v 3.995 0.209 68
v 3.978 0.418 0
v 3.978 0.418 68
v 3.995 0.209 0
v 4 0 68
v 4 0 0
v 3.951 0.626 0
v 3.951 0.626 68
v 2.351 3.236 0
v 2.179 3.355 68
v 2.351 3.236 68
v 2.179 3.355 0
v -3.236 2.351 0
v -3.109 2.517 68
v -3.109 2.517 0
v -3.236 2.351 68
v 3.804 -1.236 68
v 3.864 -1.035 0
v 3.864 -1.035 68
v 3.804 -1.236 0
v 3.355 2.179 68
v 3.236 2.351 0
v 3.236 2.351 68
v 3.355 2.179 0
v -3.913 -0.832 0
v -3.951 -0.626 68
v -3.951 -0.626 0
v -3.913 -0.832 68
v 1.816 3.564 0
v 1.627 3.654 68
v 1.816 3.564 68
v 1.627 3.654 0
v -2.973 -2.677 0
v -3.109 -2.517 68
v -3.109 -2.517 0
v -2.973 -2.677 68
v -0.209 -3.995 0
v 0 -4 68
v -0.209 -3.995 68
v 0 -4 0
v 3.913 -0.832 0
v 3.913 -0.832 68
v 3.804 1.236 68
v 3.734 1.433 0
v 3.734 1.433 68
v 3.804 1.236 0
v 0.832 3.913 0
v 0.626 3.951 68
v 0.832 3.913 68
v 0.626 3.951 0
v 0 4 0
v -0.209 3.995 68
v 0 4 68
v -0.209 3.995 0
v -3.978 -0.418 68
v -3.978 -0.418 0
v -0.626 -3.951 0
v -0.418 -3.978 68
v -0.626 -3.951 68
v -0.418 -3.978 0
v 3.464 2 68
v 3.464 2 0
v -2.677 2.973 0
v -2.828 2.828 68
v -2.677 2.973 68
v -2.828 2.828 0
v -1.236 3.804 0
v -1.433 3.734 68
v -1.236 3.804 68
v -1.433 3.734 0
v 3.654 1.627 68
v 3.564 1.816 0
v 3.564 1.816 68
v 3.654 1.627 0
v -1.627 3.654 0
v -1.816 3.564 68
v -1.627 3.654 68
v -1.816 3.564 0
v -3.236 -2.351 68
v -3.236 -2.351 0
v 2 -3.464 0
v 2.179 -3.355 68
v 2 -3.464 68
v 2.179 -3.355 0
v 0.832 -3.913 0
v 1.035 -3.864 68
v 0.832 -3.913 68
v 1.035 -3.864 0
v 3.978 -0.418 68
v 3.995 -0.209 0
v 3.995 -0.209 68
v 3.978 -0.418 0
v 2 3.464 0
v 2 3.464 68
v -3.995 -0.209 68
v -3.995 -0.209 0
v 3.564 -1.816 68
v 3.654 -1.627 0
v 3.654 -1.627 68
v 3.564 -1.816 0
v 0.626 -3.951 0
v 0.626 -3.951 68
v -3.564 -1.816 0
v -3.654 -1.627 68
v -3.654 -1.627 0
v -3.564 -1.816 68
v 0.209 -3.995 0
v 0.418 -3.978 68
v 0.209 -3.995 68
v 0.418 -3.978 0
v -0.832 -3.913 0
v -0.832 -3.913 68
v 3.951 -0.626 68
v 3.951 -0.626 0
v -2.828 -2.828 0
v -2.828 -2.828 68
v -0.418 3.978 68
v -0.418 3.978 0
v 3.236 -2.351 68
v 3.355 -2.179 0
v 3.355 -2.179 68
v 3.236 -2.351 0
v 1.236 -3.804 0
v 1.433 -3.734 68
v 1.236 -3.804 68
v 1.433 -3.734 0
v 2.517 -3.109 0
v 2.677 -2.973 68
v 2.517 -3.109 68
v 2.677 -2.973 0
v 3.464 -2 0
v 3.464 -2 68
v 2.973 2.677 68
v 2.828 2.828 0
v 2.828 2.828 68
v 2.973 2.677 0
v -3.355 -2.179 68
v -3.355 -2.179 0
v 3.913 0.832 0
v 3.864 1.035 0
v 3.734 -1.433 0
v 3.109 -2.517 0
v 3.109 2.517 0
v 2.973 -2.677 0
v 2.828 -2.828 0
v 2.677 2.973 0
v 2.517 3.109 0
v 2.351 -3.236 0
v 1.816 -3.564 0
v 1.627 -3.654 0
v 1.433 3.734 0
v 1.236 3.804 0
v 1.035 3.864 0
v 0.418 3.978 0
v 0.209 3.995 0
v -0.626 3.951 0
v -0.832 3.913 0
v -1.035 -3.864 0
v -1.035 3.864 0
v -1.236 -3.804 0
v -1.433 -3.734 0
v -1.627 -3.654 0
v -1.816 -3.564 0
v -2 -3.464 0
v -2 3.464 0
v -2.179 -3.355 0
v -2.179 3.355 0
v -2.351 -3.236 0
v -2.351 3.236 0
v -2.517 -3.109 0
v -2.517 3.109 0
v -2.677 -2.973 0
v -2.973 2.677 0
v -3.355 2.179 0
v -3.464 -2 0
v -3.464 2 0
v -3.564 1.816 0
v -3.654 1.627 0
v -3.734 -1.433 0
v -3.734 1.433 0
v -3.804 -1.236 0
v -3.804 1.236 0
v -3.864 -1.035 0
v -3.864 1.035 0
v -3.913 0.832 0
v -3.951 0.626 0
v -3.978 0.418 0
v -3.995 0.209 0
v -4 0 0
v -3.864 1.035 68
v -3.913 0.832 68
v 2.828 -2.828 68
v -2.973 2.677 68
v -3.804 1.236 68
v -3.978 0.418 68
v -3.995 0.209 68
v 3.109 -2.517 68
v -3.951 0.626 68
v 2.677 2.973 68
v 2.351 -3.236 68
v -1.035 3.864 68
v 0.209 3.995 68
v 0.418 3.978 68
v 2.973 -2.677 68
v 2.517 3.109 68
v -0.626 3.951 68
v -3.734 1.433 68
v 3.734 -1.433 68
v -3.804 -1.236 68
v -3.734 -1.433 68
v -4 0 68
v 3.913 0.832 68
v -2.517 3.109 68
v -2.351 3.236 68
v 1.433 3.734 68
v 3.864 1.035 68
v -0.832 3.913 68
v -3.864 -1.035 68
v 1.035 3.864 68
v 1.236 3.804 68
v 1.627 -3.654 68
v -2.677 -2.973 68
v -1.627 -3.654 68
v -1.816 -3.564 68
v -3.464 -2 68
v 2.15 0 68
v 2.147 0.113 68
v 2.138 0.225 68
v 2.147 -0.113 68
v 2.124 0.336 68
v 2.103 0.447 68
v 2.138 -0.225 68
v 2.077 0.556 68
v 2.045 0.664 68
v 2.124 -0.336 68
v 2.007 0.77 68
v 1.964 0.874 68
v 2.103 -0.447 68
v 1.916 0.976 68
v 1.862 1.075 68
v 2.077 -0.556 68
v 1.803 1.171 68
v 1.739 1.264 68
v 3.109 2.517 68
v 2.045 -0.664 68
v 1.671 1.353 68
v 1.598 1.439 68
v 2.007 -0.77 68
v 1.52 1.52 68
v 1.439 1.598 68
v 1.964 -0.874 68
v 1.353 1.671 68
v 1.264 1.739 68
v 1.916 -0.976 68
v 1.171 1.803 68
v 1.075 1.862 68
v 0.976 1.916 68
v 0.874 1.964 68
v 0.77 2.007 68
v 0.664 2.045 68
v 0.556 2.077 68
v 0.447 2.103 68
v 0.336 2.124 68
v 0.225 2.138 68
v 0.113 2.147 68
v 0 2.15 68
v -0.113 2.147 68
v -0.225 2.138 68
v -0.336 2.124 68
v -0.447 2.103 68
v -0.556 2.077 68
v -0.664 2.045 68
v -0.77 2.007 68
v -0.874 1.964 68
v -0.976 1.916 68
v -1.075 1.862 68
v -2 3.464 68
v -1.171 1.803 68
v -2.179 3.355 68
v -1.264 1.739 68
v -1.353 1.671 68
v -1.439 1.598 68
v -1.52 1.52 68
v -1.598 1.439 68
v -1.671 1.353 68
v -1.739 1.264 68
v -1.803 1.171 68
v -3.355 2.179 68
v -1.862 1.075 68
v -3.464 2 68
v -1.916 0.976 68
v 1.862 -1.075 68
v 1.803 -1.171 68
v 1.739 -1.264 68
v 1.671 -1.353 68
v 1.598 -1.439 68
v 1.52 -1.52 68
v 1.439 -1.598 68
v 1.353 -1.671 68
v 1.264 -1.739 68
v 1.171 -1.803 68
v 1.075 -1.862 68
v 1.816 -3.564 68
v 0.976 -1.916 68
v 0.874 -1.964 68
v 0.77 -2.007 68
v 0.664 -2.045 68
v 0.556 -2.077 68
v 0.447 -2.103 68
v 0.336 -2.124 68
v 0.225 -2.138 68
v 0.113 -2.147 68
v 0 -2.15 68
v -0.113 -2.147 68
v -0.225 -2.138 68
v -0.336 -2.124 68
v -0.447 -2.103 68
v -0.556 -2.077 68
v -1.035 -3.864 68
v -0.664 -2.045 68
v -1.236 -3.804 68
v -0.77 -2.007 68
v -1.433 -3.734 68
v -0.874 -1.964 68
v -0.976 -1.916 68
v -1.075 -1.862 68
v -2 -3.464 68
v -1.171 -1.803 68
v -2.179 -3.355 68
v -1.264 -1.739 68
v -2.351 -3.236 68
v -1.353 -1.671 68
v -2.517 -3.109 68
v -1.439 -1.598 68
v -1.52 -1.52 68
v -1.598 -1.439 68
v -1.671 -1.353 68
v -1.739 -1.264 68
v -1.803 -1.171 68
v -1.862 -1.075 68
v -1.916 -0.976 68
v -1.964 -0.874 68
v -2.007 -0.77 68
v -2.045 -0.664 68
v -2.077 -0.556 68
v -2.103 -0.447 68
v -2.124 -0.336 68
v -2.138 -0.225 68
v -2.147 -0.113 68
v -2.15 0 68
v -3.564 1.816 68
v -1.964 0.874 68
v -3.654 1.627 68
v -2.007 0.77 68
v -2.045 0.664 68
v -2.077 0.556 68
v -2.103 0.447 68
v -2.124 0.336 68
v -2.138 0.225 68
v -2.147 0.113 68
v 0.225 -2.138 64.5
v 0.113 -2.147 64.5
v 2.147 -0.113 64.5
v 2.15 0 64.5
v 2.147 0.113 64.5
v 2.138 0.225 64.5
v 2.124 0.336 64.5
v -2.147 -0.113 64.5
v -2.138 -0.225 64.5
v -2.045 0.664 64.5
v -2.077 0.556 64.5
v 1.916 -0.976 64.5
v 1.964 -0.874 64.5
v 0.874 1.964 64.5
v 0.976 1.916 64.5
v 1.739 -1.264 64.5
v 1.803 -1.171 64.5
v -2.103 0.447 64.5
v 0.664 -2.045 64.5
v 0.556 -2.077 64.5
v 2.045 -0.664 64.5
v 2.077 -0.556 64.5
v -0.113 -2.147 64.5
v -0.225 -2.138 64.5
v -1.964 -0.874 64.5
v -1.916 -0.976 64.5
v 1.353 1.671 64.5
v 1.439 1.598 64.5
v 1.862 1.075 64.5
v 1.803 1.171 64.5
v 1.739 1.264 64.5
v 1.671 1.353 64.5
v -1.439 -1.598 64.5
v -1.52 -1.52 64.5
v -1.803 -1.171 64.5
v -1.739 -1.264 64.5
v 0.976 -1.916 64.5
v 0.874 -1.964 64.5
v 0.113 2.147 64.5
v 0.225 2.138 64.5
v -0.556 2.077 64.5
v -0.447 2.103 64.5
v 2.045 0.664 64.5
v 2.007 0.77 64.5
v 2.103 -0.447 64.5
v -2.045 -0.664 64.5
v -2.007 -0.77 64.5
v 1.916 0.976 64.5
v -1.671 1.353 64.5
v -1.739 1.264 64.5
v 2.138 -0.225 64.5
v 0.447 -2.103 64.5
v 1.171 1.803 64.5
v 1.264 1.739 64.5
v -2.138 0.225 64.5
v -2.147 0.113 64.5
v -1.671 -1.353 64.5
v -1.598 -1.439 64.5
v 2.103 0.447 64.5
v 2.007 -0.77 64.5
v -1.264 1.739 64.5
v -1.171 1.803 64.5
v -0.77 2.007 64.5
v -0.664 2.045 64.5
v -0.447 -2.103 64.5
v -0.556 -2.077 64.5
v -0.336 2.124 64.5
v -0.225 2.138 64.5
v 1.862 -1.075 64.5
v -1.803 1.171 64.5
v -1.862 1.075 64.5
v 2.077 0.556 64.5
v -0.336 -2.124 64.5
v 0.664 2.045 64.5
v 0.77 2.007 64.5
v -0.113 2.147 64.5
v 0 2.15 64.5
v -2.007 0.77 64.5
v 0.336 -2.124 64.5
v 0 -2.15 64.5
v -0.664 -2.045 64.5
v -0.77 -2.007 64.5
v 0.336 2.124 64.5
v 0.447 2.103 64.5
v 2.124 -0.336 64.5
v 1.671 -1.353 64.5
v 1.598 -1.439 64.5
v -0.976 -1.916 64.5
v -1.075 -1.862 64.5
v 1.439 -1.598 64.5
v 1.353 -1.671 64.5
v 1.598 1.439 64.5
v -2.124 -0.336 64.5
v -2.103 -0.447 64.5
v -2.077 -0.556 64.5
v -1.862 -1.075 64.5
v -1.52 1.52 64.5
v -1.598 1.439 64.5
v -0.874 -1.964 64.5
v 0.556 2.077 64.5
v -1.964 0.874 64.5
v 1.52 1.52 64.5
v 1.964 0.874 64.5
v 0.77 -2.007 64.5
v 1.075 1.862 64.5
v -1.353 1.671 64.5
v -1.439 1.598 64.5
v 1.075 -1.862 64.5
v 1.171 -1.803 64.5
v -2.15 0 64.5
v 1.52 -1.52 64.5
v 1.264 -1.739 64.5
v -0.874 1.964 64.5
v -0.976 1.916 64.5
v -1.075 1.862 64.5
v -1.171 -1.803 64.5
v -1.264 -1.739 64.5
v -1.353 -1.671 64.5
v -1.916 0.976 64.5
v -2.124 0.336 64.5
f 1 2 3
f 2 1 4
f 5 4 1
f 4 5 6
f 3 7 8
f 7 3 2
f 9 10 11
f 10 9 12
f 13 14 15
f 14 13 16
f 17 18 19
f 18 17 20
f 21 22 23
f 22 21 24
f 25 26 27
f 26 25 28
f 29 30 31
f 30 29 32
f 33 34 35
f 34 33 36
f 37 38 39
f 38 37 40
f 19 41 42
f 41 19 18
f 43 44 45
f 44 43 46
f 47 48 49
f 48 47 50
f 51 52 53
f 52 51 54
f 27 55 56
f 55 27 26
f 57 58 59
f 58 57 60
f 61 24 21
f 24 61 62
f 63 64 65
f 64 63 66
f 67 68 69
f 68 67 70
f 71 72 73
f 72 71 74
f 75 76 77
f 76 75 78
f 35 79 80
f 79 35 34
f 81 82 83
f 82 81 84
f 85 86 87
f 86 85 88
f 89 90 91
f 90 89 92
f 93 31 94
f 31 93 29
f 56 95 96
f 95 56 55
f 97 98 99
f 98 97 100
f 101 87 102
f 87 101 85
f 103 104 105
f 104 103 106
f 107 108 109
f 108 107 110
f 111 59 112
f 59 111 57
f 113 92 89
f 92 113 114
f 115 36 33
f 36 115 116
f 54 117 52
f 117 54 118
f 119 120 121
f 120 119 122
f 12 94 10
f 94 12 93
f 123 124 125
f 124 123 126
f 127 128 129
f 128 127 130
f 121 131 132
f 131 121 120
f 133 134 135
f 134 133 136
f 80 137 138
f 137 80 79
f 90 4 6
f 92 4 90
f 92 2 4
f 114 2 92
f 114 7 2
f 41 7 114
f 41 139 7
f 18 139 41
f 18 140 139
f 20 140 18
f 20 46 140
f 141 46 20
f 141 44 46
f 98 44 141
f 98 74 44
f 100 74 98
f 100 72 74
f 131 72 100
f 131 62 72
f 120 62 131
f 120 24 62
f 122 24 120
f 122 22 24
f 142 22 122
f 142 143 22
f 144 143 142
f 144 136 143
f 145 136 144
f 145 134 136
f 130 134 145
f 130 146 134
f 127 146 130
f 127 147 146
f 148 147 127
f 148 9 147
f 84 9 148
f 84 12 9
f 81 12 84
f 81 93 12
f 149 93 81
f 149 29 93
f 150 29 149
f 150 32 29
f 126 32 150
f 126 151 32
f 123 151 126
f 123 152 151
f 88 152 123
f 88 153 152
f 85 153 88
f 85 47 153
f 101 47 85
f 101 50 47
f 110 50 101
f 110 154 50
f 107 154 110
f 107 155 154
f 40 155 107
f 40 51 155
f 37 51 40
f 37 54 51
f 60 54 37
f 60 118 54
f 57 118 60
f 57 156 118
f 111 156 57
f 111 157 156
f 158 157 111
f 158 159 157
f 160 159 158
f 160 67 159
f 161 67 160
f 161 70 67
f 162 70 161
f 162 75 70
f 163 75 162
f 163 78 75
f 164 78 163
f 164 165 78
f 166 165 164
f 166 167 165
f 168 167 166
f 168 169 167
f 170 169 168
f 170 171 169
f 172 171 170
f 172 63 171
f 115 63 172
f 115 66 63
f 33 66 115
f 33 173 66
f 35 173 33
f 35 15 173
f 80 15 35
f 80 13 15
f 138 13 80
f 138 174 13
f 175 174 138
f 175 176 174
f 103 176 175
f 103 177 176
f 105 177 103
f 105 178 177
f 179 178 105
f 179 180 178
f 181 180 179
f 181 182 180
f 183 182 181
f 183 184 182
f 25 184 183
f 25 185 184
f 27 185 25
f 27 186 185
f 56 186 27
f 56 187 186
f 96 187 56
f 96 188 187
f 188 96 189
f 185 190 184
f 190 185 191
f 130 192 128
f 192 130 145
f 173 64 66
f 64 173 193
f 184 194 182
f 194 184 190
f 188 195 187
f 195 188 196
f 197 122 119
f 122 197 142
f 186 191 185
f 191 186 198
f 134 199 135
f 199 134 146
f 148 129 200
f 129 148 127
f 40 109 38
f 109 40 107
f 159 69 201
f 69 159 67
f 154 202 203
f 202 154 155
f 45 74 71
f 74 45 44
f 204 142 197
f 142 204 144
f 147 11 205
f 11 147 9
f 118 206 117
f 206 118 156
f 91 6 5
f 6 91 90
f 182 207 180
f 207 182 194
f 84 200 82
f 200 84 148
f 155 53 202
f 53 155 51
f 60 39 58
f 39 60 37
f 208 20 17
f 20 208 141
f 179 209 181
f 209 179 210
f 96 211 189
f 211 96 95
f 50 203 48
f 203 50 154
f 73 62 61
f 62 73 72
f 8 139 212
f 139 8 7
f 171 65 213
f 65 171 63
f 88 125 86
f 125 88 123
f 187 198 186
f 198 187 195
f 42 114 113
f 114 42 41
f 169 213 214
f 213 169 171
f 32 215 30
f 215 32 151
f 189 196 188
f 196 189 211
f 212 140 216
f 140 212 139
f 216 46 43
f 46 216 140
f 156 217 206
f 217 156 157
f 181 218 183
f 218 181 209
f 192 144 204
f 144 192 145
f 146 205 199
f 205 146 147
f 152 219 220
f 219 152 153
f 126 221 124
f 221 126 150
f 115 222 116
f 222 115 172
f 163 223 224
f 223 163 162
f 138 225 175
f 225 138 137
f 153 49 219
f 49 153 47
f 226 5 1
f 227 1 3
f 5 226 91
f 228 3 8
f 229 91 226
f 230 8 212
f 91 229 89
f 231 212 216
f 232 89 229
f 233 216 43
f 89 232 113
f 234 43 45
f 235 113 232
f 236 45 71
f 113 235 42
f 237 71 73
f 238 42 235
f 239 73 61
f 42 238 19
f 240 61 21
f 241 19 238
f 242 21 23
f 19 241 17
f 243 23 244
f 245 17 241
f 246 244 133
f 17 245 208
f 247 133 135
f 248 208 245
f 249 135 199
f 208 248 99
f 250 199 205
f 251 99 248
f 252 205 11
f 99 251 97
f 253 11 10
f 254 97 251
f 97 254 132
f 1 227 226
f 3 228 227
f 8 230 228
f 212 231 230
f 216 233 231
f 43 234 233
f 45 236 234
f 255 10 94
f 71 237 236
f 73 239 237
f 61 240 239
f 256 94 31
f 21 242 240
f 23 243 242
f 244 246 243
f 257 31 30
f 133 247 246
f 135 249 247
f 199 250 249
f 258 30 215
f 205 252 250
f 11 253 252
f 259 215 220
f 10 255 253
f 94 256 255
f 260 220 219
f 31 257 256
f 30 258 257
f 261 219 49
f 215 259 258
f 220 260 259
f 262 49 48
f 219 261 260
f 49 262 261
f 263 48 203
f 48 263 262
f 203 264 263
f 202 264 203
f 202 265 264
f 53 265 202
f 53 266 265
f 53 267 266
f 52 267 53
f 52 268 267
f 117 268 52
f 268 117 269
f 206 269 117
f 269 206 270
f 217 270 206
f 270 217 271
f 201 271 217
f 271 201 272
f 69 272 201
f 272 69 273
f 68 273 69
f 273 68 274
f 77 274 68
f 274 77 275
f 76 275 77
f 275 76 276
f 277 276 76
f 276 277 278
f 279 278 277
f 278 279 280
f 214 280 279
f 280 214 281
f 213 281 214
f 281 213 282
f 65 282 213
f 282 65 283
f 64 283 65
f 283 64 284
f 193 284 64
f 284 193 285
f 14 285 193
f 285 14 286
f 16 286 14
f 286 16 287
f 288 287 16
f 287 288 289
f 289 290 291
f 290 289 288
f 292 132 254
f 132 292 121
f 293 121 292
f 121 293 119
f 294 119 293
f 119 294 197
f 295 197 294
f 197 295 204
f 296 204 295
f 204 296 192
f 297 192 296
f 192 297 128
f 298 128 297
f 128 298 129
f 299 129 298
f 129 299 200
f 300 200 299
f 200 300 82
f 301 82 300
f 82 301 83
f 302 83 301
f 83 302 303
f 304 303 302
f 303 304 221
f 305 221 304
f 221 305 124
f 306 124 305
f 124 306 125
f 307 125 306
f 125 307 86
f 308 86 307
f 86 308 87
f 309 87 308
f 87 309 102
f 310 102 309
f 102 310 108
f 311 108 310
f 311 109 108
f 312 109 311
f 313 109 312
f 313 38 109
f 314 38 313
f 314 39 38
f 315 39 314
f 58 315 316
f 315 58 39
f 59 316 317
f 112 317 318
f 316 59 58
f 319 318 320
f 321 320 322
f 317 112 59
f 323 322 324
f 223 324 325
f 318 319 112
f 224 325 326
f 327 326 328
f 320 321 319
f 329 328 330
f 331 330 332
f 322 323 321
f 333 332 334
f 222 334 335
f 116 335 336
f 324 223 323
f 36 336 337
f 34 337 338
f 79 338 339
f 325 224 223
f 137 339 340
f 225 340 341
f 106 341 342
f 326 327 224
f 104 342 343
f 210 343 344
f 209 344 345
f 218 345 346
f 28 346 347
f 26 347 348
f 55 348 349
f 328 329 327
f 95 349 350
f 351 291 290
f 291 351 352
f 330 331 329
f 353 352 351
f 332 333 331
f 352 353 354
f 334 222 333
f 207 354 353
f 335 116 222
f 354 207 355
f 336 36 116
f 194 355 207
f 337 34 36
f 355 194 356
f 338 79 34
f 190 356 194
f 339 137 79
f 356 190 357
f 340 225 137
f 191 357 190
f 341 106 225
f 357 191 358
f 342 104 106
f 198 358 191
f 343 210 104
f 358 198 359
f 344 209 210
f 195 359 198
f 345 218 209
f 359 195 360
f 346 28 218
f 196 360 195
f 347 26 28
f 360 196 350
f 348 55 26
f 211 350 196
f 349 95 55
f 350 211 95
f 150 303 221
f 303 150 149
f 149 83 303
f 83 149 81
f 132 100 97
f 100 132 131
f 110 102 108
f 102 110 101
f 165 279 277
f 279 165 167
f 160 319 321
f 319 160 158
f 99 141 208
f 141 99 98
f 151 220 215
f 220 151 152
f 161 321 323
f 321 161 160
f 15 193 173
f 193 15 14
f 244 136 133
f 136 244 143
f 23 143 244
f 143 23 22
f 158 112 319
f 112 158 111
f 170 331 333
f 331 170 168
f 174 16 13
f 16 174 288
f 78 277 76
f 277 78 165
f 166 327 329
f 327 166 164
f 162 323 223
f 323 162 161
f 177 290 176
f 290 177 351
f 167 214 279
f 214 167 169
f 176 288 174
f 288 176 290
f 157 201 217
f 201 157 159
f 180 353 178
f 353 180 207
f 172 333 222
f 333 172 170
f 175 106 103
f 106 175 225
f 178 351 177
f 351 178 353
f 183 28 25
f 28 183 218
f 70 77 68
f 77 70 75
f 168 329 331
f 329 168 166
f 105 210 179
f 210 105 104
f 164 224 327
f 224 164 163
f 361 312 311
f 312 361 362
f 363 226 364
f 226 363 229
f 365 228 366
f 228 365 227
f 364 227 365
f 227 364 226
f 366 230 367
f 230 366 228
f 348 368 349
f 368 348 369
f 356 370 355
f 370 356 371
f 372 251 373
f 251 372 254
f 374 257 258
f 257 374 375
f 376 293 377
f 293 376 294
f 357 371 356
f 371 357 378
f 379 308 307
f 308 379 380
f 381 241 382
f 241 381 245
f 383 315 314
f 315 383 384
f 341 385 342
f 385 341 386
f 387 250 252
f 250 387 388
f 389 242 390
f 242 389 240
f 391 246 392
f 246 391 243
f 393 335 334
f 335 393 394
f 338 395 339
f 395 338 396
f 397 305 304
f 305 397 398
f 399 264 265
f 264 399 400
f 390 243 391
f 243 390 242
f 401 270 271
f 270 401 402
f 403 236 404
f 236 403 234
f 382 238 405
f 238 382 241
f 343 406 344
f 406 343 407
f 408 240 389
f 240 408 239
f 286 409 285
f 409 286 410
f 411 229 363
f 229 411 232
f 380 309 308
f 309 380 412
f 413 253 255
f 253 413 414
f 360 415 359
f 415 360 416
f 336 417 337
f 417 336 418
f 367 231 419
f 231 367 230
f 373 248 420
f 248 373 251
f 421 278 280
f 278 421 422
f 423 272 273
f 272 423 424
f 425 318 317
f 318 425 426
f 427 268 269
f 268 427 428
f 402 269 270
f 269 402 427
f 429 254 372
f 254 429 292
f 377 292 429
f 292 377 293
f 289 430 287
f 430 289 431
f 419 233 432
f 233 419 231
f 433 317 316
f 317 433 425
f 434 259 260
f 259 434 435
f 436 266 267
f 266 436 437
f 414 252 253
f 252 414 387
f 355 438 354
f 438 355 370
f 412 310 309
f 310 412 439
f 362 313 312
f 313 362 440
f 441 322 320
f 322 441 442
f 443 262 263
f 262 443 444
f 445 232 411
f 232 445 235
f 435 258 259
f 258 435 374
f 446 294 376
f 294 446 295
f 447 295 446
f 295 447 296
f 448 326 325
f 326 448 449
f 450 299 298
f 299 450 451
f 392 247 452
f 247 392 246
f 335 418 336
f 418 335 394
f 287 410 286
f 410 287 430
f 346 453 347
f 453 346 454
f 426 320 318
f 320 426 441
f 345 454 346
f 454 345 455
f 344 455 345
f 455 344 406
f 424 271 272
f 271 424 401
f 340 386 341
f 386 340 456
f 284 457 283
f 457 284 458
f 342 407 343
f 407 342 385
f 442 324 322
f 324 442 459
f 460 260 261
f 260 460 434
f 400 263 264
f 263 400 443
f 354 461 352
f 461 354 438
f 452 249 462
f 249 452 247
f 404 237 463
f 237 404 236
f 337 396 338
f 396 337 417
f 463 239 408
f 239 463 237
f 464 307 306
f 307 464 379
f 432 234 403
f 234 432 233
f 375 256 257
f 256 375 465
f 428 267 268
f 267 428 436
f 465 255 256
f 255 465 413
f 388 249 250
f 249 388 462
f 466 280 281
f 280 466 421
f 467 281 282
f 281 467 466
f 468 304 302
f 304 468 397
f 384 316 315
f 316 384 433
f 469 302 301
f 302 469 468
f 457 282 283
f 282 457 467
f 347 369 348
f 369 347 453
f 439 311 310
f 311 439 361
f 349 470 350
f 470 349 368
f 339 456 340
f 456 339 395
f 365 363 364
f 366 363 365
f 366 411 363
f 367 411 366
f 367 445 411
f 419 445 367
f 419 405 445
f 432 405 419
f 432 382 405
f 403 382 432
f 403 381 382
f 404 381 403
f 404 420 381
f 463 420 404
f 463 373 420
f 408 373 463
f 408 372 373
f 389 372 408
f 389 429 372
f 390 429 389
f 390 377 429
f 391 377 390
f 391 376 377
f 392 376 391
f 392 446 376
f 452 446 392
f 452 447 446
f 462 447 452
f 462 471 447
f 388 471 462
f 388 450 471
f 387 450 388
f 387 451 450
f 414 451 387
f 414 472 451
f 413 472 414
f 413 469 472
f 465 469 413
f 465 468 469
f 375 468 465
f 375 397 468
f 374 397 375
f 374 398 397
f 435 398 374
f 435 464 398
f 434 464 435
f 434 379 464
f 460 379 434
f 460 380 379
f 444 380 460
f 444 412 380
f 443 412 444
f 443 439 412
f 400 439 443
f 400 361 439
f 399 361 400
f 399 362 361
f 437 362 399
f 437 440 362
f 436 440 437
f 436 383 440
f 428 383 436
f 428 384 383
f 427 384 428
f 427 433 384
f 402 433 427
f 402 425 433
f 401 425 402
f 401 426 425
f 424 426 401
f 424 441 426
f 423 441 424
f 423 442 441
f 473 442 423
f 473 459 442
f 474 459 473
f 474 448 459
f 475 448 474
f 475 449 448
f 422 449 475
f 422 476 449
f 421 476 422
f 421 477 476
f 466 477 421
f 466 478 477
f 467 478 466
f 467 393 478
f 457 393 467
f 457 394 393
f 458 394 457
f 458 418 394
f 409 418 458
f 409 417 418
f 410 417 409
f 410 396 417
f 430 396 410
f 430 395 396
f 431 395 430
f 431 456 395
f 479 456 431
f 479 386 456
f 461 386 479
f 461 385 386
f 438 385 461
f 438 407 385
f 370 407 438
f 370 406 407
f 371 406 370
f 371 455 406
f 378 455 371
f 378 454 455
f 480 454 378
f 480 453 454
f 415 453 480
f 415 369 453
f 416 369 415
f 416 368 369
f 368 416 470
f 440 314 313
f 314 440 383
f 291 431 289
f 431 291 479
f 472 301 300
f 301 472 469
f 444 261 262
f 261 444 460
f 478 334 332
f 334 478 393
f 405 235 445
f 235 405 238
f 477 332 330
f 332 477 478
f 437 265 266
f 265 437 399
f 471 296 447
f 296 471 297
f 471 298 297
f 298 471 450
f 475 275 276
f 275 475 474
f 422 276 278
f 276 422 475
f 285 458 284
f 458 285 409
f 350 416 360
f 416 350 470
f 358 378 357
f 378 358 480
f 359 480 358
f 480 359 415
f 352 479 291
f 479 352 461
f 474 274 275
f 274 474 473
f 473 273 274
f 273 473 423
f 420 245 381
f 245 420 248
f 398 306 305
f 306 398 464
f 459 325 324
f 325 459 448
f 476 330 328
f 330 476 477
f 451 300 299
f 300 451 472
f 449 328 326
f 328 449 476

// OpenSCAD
// ==========================================================================
//  TEST VARIANT — hand-built, NOT produced by build/build.py.
//  Forked from v1.0 SCADs/Bottle_Hex_Shaft_v1.scad (Turtle Body v1.10.0).
//  Do not treat this as a source-of-truth bundle: it is a one-off experiment
//  and is not wired into lib/, src/, build/build.py, build/lint.py,
//  build/test.py or VERSION.json. If this redesign is adopted for real, port
//  it into lib/params.scad + lib/hex_shaft.scad through the normal workflow
//  (CLAUDE.md section 15) instead of hand-editing this file further.
//
//  DELIBERATE REDESIGN, latest cut: the hex-top piece is dropped entirely --
//  this file now emits ONLY the round shaft, a single straight Ø8 mm
//  cylinder (no 7 mm neck, no taper). Overall length is 20 mm longer than
//  the previous 48 mm two-part shaft length, i.e. 68 mm. The magnet recess
//  opens at one end, deepened to 3.5 mm (was 3) with a wider +0.3 mm
//  diametral fit margin (was +0.1) for easier insertion.
//
//  Units: mm. License: CERN-OHL-S-2.0 (same as the rest of this repository).
// ==========================================================================

/* [Round shaft -- straight, constant diameter, no taper] */
shaft_d   = 8;    // full diameter, constant along the whole length
shaft_len = 68;   // previous two-part length (48) + 20 mm

/* [Magnet recess -- blind hole at one end] */
magnet_recess_enabled = true;
magnet_diameter    = 4;    // nominal magnet size
magnet_fit_margin  = 0.3;  // diametral allowance added on top, for insertion (was 0.1)
magnet_depth       = 3.5;  // was 3

/* [Render] */
fn = 120; // [48:8:240]

// [bundle] begin use <params.scad>
// ==========================================================================
//  Turtle Body -- shared dimension contract
// --------------------------------------------------------------------------
//  The single source of truth for every dimension that more than one
//  subsystem depends on. Values are exposed as zero-argument functions so
//  this file can be pulled in with `use <params.scad>` (which ignores
//  top-level variable assignments) without polluting any namespace.
//
//  lib/ modules take these as DEFAULT argument values:
//      module control_cap(roof_t = p_cap_roof_t(), ...) { ... }
//  so a src/ wrapper can still override one value from its customizer block
//  while every other subsystem keeps the shared number.
//
//  Rules:
//   * one function per concept, canonical name (see CLAUDE.md cross-file table)
//   * derived values are functions of other p_*() functions, never re-typed
//   * mm throughout; names say _d (diameter), _r (radius), _t (thickness),
//     _len / _h (axial), _af (hex across-flats)
//   * do NOT add a bare `x = ...;` here -- bundle.py / lint.py will reject it
// ==========================================================================

// ---- tolerances and render quality --------------------------------------
function p_eps()          = 0.02;   // Boolean overlap / cut-through fudge
function p_fit_clearance() = 0.2;   // wood joint: TOTAL extra slot width, centred on the board
function p_fn_plastic()   = 120;    // printed PLA parts (cap, cage, axle, mold)
function p_fn_wood()      = 96;     // cut wooden parts
function p_fn_curve()     = 180;    // fine profile curves (bottle, sails)

// ---- bottle (the foundation reference) ---------------------------------
function p_bottle_d()        = 82;    // outside diameter
function p_bottle_h()        = 305;   // total height incl. ordinary screw cap
function p_bottle_wall_t()   = 0.5;   // modelling assumption, not a measurement
function p_bottle_cap_d()    = 31;    // ordinary screw cap (NOT the control-cap disk)
function p_bottle_cap_h()    = 17;    // ordinary screw cap height (rear-fin / ballast formulas)
function p_collar_d()        = 34;    // bottle collar, independent of cap diameter
function p_top_dome_h()      = 62;
function p_bottom_dome_h()   = 25;
function p_dome_power()      = 2.5;   // superellipse exponent
function p_bottle_neck_h()   = 5;
function p_bottle_collar_h() = 1;
function p_bottle_neck_d()   = p_bottle_cap_d() - 3;   // 28: neck is 3 mm under the cap
function p_bottle_base_ratio() = 0.88; // slightly narrower footprint at the base
function p_bottle_profile_steps() = 16;
// cut bottle (control head): the lower dome is removed and a short socket is
// bored so the control-cap insert slides in. Cut plane sits 5 mm above the
// bottom dome height.
function p_bottle_cut_extra()  = 5;
function p_bottle_cut_height() = p_bottom_dome_h() + p_bottle_cut_extra();   // 30

// nominal bottle interior and the cap insert that enters it
function p_bottle_socket_d() = p_bottle_d() - 2 * p_bottle_wall_t();          // 81
function p_insert_shaft_radial_clearance() = 1;
function p_insert_shaft_d()  = p_bottle_socket_d()
                             - 2 * p_insert_shaft_radial_clearance();          // 79

// ---- wooden stock -----------------------------------------------------
function p_wood_t()          = 12;    // shared board / slat thickness
function p_fin_board_w()     = 93;    // shared fin-system stock width
function p_screw_side_offset() = 25;  // mounting-hole inset from a John end

// ---- Ecojoiner port --------------------------------------------------
// A port must swallow the bottle's tapered top (the top dome) plus a seating
// allowance, so its axial length is DERIVED from the bottle, not fixed. This
// is the same rule the HopeTurtles.org generators use
// (port_length = taper_height + port_allowance); until 2026-09-08 lib carried
// the evaluated constant 82 instead, which silently broke the rule for any
// bottle other than the reference one. Ballast and Ecojoiner both read it.
function p_port_allowance()  = 20;                 // seating allowance beyond the dome
function p_port_length()     = p_top_dome_h() + p_port_allowance();   // 62 + 20 = 82
function p_port_height()     = p_bottle_d();       // opening height == bottle diameter (asserted)

// ---- M6 hardware ---------------------------------------------------
function p_m6_clearance_d()  = 6.4;   // M6 clearance hole
function p_m6_bolt_shaft_d() = 6;     // visual placeholder only
function p_m6_bolt_head_d()  = 12;
function p_m6_bolt_head_t()  = 4;

// ---- control cap (large stationary disk; see CLAUDE.md s7) ----------
//  TB-03 resolution: repository 5 mm roof / 2 mm boss is authoritative;
//  the axle (below) is derived to this datum.
function p_cap_disk_d()      = 100;   // control-cap disk (independent of p_bottle_cap_d)
function p_cap_roof_t()      = 5;     // disk / roof thickness
function p_cap_boss_depth()  = 2;     // extra projection of the centre boss into the hollow cap
function p_cap_boss_d()      = 18;
function p_cap_insert_len()  = 35;    // straight insert shaft length
function p_cap_insert_wall_t() = 4;
function p_cap_entry_chamfer_h()     = 1;
function p_cap_entry_chamfer_delta() = 1;
function p_cap_axle_bore_d() = 8.6;   // 0.3 mm radial clearance to the Ø8 shaft
function p_cap_cage_radial_clearance() = 1;   // cap disk -> cage inner wall (radial)
function p_cap_total_h()     = p_cap_roof_t() + p_cap_insert_len();           // 40
function p_cap_bearing_len() = p_cap_roof_t() + p_cap_boss_depth();           // 7

// buttons (through both cap and cage)
function p_button_upper_d()  = 17;    // clearance hole in the cap
function p_button_axis()     = "y";   // "x" or "y"
function p_button_radius()   = 24;    // radial position of the two button centres (48 mm apart)

// ---- silicone seal grooves + rings (CLAUDE.md s8) ------------------
function p_seal_groove_count()      = 2;
function p_seal_groove_axial_h()    = 2;   // groove height
function p_seal_groove_radial_depth() = 2; // groove depth
function p_seal_groove1_from_shoulder() = 12;  // groove centre, measured from the insert SHOULDER
function p_seal_groove2_from_shoulder() = 25;
function p_seal_ring_axial_t()      = 1.5;  // cast ring thickness
function p_seal_ring_radial_w()     = 5;    // NOT validated; 3.5 was a suggested milder prototype
function p_seal_groove_root_d() = p_insert_shaft_d()
                                - 2 * p_seal_groove_radial_depth();            // 75

// ---- round / hex centre axle (CLAUDE.md s9) -----------------------
//  Derived to the 5/2 cap datum (TB-03/TB-04). round_inside_cap is measured
//  from the roof underside and INCLUDES the boss -- do not add the boss again.
function p_axle_round_d()        = 8;
function p_axle_round_ext()      = 1;    // projection above the cap's outer face
function p_axle_round_inside_cap() = p_cap_insert_len() - 5;  // 30: roof underside to round end (incl. boss)
function p_axle_round_len()      = p_axle_round_inside_cap() + p_cap_roof_t() + p_axle_round_ext();  // 36
function p_axle_hex_af()         = 10.0; // shaft across-flats (0.3 mm to the Ø10.3 cage bore)
function p_axle_hex_len()        = 23;
function p_axle_join_overlap()   = 0.2;  // hex<->round Boolean overlap
function p_axle_total_len()      = p_axle_hex_len() + p_axle_round_len();
function p_axle_hex_corner_d()   = p_axle_hex_af() / cos(30);                  // ~11.55
function p_magnet_d()            = 3;    // AS5600 sensing magnet recess
function p_magnet_t()            = 1;

// ---- axle rotary shaft O-ring (waterproofs the axle bore; cast in the mold) ----
//  A round-section O-ring seated in a gland in the control-cap bore, sealing
//  against the spinning round section of the axle. ID is tied to the shaft.
function p_axle_oring_cs()     = 2.0;                                   // cross-section
function p_axle_oring_id()     = p_axle_round_d();                      // 8 -- hugs the shaft
function p_axle_oring_od()     = p_axle_oring_id() + 2 * p_axle_oring_cs();          // 12
function p_axle_oring_mean_r() = (p_axle_oring_id() + p_axle_oring_cs()) / 2;        // 5
//  gland cut into the cap bore for it
function p_cap_oring_squeeze()      = 0.25;  // radial squeeze on the seal
function p_cap_oring_gland_od()     = p_axle_oring_od() - 2 * p_cap_oring_squeeze(); // 11.5
function p_cap_oring_gland_w()      = 1.3 * p_axle_oring_cs();                       // 2.6 axial
function p_cap_oring_gland_from_face() = 3.5; // gland centre, from the cap outer face, along the bore

// ---- rotating control cage (CLAUDE.md s6) ------------------------
function p_cage_wall_t()     = 6.5;   // radial wall thickness
function p_cage_roof_t()     = 4;     // roof / surface plate thickness
function p_cage_inner_d()    = p_cap_disk_d() + 2 * p_cap_cage_radial_clearance();   // 102
function p_cage_outer_d()    = p_cage_inner_d() + 2 * p_cage_wall_t();               // 115
function p_cage_skirt_depth()   = 44;   // roof underside to the ORIGINAL skirt rim
function p_cage_peak_extension() = 20;  // crest extends this far past the original rim
function p_cage_valley_wall_h()  = 10;  // minimum wall depth between mounts
function p_cage_total_h()    = p_cage_skirt_depth() + p_cage_roof_t();              // 48 (native)
function p_cage_notch_count()   = 4;
function p_cage_notch_w()    = 22.5;  // batten groove width
function p_cage_notch_depth() = 3.7;
function p_cage_wave_segments() = 240;
function p_cage_hub_d()      = 29;
function p_cage_pocket_d()   = 26;    // top clip pocket (control_cage top_pocket, OFF by default)
function p_cage_pocket_depth() = 4;   //   "        "     "
function p_cage_hex_bore_af() = 10.3; // central hex bore (0.3 mm to the Ø10.0 shaft)
function p_cage_bearing_d()  = 9;     // hemispherical bearing bump
function p_cage_bearing_count() = 8;
function p_cage_bearing_pcd() = p_cap_disk_d() - p_cage_bearing_d() + 0.5;          // 91.5
function p_cage_top_hole_d() = 18;    // central button / access hole through the roof
function p_cage_mount_hole_d() = 3.2; // two M3 clearance holes per batten / groove
function p_cage_mount_pitch()  = 32;  // vertical pitch of the pair
function p_cage_lower_hole_from_tip() = 10;
// 45-deg outward chamfer on the roof-top outer edge (0 = sharp). The cage
// prints roof-face-down, so this bevel flares OUT from the bed and stays
// printable; it runs the full perimeter, batten grooves included. See
// lib/control_cage.scad.
function p_cage_roof_bevel() = 3;

// ---- sail apparatus (CLAUDE.md s10) ---------------------------
function p_side_batten_h()   = 205;
function p_side_batten_w()   = 20;
function p_side_batten_radial_t() = 10;
function p_top_crossbar_len() = 6 * p_bottle_d();   // 492
function p_top_crossbar_w()  = 22;
function p_top_crossbar_t()  = p_wood_t();          // 12
function p_sail_bar_axle_hole_d() = 12;             // Ø12; fits the ~11.55 hex corner dia
function p_bottom_rail_len() = 3 * p_bottle_d();    // 246
function p_bottom_rail_bottle_clearance() = 1;
function p_sail_rail_color()  = [0.56, 0.39, 0.39]; // brown (top AND bottom rails)
function p_c_piece_color()    = [1.0, 0.52, 0.20];  // orange, retained

// ---- rear fin + solar support (CLAUDE.md s11) ----------------
function p_solar_panel_w() = 148;
function p_solar_panel_h() = 223;
function p_solar_panel_t() = 2.5;    // real panel, independent of wood thickness
function p_rear_shaft_len() = p_bottle_h()
                            + (2/3) * (p_fin_board_w() - 2 * p_wood_t())
                            - p_bottle_cap_h();                                 // 334
function p_rear_half_lap_engagement() = 42;   // green/yellow interlock depth
function p_rear_fin_tab_width() = 15;
function p_rear_shaft_width()   = 59;
// TB-07: the green-slat mounting hole follows the mating Ecojoiner John, not a
// fixed 50 mm. Derived from the install transform; the john_length/2 terms
// cancel, leaving a pure function of the shared contract (= 103 at defaults).
function p_rear_shaft_hole_from_front() =
    p_rear_shaft_len() - p_screw_side_offset() - p_bottle_h()
    + p_bottle_cap_h() + p_port_height();

// ---- ballast attachment (CLAUDE.md s12) ---------------------
function p_ballast_core_w()   = p_bottle_d() - 2 * p_wood_t();                  // 58
function p_ballast_core_len() = p_bottle_h() - p_bottle_cap_h() + 6 * p_wood_t();  // 360
function p_ballast_slat_gap() = p_bottle_d();          // clear inner-face gap
function p_ballast_slat_spacing() = p_bottle_d() + p_wood_t();                  // 94
function p_ballast_board_len() = 3.5 * p_bottle_d();   // 287
function p_ballast_fin_len()   = 3 * p_bottle_d();     // 246
function p_ballast_lock_w()    = 5 * p_wood_t();       // 60

// ---- neutral wood shades (used when enable_color_coding = false) -------
// With the full colour code off, every wooden subsystem still renders in its
// OWN shade of brown so the parts stay visually separable. All are warm browns
// (R > G > B) spaced by lightness. The two large fins share one darker shade so
// they read as a matched pair, distinct from the rest of their own assembly.
function p_wood_shade_sail()     = [0.85, 0.66, 0.47]; // sail frame  (lightest)
function p_wood_shade_rear_fin() = [0.72, 0.50, 0.33]; // rear-fin shafts + solar holder
function p_wood_shade_eco()      = [0.62, 0.44, 0.28]; // Ecojoiner core
function p_wood_shade_ballast()  = [0.52, 0.34, 0.22]; // ballast slats / board / locks
function p_wood_shade_fin()      = [0.40, 0.26, 0.17]; // rear fin + ballast fin, shared (darkest)
// [bundle] end   <params.scad>

// Round shaft -- a single straight Ø8 mm cylinder, no neck, no taper, no
// separate hex-top piece. The magnet recess (a blind hole, not through)
// opens at one end for the sensing magnet.
module shaft_round_part(d            = 8,
                        len          = 68,
                        magnet       = true,
                        magnet_d     = 4,
                        magnet_fit_margin = 0.3,
                        magnet_depth = 3.5,
                        fn           = undef) {
    nn = fn == undef ? p_fn_plastic() : fn;
    magnet_hole_d = magnet_d + magnet_fit_margin;

    assert(d > 0 && len > 0, "shaft_round_part: diameter and length must be positive.");
    assert(!magnet || (magnet_fit_margin >= 0 && magnet_hole_d > 0 && magnet_hole_d < d
           && magnet_depth > 0 && magnet_depth < len),
           "shaft_round_part: magnet recess (incl. fit margin) must fit inside the shaft.");

    $fn = nn;
    difference() {
        cylinder(d = d, h = len);
        if (magnet)
            translate([0, 0, len - magnet_depth])
                cylinder(d = magnet_hole_d, h = magnet_depth + p_eps());
    }

    echo("SHAFT: diameter / length = ", d, len);
    if (magnet)
        echo("SHAFT: magnet nominal / fit margin / hole dia / depth = ",
             magnet_d, magnet_fit_margin, magnet_hole_d, magnet_depth);
}

color([0.74, 0.77, 0.79])
    shaft_round_part(d            = shaft_d,
                     len          = shaft_len,
                     magnet       = magnet_recess_enabled,
                     magnet_d     = magnet_diameter,
                     magnet_fit_margin = magnet_fit_margin,
                     magnet_depth = magnet_depth,
                     fn           = fn);
